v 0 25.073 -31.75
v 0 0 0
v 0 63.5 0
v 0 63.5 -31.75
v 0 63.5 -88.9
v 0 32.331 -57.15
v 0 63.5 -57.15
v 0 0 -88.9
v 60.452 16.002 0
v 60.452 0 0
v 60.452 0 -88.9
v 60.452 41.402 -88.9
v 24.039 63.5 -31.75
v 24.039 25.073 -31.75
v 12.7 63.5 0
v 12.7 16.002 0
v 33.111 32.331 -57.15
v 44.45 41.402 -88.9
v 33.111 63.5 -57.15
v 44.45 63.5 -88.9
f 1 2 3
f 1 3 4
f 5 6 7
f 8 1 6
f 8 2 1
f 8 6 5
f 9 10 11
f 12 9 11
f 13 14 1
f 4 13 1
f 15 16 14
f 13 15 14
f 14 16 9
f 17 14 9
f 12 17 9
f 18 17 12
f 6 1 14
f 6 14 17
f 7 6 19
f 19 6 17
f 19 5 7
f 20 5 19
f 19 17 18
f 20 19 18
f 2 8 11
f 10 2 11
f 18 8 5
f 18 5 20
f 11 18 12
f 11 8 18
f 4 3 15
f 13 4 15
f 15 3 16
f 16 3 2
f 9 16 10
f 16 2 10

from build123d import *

# Parameters (mm, degrees)
SKETCH3_W           = 60.452
SKETCH3_H           = 88.9
BOSS_EXTRUDE1_DEPTH = 63.5
CUT_EXTRUDE1_DEPTH  = 63.5
BOSS_EXTRUDE2_DEPTH = 63.5


with BuildPart() as part:
    # Sketch3 → Boss-Extrude1 (new body)
    with BuildSketch(Plane(origin=(0, 0, 0), x_dir=(1, 0, 0), z_dir=(0, 1, 0))):
        with Locations((30.226, 44.45)):
            Rectangle(SKETCH3_W, SKETCH3_H)
    extrude(amount=BOSS_EXTRUDE1_DEPTH)

    # Sketch4 → Cut-Extrude1 (cut)
    with BuildSketch(Plane(origin=(0, 0, 0), x_dir=(0, 0, -1), z_dir=(1, 0, 0))):
        Polygon((0, 16.002), (88.9, 41.402), (88.9, 63.5), (0, 63.5), align=None)
    extrude(amount=CUT_EXTRUDE1_DEPTH, mode=Mode.SUBTRACT)

    # Sketch5 → Boss-Extrude2 (add)
    with BuildSketch(Plane(origin=(0, 0, 0), x_dir=(1, 0, 0), z_dir=(0, 1, 0))):
        Polygon((33.110714286, 57.15), (44.45, 88.9), (18.107802509, 88.9), (0, 88.9), (0, 57.15), align=None)
        Polygon((12.7, 0), (24.039285714, 31.75), (0, 31.75), (0, 0), align=None)
    extrude(amount=BOSS_EXTRUDE2_DEPTH)


solid = part.part
